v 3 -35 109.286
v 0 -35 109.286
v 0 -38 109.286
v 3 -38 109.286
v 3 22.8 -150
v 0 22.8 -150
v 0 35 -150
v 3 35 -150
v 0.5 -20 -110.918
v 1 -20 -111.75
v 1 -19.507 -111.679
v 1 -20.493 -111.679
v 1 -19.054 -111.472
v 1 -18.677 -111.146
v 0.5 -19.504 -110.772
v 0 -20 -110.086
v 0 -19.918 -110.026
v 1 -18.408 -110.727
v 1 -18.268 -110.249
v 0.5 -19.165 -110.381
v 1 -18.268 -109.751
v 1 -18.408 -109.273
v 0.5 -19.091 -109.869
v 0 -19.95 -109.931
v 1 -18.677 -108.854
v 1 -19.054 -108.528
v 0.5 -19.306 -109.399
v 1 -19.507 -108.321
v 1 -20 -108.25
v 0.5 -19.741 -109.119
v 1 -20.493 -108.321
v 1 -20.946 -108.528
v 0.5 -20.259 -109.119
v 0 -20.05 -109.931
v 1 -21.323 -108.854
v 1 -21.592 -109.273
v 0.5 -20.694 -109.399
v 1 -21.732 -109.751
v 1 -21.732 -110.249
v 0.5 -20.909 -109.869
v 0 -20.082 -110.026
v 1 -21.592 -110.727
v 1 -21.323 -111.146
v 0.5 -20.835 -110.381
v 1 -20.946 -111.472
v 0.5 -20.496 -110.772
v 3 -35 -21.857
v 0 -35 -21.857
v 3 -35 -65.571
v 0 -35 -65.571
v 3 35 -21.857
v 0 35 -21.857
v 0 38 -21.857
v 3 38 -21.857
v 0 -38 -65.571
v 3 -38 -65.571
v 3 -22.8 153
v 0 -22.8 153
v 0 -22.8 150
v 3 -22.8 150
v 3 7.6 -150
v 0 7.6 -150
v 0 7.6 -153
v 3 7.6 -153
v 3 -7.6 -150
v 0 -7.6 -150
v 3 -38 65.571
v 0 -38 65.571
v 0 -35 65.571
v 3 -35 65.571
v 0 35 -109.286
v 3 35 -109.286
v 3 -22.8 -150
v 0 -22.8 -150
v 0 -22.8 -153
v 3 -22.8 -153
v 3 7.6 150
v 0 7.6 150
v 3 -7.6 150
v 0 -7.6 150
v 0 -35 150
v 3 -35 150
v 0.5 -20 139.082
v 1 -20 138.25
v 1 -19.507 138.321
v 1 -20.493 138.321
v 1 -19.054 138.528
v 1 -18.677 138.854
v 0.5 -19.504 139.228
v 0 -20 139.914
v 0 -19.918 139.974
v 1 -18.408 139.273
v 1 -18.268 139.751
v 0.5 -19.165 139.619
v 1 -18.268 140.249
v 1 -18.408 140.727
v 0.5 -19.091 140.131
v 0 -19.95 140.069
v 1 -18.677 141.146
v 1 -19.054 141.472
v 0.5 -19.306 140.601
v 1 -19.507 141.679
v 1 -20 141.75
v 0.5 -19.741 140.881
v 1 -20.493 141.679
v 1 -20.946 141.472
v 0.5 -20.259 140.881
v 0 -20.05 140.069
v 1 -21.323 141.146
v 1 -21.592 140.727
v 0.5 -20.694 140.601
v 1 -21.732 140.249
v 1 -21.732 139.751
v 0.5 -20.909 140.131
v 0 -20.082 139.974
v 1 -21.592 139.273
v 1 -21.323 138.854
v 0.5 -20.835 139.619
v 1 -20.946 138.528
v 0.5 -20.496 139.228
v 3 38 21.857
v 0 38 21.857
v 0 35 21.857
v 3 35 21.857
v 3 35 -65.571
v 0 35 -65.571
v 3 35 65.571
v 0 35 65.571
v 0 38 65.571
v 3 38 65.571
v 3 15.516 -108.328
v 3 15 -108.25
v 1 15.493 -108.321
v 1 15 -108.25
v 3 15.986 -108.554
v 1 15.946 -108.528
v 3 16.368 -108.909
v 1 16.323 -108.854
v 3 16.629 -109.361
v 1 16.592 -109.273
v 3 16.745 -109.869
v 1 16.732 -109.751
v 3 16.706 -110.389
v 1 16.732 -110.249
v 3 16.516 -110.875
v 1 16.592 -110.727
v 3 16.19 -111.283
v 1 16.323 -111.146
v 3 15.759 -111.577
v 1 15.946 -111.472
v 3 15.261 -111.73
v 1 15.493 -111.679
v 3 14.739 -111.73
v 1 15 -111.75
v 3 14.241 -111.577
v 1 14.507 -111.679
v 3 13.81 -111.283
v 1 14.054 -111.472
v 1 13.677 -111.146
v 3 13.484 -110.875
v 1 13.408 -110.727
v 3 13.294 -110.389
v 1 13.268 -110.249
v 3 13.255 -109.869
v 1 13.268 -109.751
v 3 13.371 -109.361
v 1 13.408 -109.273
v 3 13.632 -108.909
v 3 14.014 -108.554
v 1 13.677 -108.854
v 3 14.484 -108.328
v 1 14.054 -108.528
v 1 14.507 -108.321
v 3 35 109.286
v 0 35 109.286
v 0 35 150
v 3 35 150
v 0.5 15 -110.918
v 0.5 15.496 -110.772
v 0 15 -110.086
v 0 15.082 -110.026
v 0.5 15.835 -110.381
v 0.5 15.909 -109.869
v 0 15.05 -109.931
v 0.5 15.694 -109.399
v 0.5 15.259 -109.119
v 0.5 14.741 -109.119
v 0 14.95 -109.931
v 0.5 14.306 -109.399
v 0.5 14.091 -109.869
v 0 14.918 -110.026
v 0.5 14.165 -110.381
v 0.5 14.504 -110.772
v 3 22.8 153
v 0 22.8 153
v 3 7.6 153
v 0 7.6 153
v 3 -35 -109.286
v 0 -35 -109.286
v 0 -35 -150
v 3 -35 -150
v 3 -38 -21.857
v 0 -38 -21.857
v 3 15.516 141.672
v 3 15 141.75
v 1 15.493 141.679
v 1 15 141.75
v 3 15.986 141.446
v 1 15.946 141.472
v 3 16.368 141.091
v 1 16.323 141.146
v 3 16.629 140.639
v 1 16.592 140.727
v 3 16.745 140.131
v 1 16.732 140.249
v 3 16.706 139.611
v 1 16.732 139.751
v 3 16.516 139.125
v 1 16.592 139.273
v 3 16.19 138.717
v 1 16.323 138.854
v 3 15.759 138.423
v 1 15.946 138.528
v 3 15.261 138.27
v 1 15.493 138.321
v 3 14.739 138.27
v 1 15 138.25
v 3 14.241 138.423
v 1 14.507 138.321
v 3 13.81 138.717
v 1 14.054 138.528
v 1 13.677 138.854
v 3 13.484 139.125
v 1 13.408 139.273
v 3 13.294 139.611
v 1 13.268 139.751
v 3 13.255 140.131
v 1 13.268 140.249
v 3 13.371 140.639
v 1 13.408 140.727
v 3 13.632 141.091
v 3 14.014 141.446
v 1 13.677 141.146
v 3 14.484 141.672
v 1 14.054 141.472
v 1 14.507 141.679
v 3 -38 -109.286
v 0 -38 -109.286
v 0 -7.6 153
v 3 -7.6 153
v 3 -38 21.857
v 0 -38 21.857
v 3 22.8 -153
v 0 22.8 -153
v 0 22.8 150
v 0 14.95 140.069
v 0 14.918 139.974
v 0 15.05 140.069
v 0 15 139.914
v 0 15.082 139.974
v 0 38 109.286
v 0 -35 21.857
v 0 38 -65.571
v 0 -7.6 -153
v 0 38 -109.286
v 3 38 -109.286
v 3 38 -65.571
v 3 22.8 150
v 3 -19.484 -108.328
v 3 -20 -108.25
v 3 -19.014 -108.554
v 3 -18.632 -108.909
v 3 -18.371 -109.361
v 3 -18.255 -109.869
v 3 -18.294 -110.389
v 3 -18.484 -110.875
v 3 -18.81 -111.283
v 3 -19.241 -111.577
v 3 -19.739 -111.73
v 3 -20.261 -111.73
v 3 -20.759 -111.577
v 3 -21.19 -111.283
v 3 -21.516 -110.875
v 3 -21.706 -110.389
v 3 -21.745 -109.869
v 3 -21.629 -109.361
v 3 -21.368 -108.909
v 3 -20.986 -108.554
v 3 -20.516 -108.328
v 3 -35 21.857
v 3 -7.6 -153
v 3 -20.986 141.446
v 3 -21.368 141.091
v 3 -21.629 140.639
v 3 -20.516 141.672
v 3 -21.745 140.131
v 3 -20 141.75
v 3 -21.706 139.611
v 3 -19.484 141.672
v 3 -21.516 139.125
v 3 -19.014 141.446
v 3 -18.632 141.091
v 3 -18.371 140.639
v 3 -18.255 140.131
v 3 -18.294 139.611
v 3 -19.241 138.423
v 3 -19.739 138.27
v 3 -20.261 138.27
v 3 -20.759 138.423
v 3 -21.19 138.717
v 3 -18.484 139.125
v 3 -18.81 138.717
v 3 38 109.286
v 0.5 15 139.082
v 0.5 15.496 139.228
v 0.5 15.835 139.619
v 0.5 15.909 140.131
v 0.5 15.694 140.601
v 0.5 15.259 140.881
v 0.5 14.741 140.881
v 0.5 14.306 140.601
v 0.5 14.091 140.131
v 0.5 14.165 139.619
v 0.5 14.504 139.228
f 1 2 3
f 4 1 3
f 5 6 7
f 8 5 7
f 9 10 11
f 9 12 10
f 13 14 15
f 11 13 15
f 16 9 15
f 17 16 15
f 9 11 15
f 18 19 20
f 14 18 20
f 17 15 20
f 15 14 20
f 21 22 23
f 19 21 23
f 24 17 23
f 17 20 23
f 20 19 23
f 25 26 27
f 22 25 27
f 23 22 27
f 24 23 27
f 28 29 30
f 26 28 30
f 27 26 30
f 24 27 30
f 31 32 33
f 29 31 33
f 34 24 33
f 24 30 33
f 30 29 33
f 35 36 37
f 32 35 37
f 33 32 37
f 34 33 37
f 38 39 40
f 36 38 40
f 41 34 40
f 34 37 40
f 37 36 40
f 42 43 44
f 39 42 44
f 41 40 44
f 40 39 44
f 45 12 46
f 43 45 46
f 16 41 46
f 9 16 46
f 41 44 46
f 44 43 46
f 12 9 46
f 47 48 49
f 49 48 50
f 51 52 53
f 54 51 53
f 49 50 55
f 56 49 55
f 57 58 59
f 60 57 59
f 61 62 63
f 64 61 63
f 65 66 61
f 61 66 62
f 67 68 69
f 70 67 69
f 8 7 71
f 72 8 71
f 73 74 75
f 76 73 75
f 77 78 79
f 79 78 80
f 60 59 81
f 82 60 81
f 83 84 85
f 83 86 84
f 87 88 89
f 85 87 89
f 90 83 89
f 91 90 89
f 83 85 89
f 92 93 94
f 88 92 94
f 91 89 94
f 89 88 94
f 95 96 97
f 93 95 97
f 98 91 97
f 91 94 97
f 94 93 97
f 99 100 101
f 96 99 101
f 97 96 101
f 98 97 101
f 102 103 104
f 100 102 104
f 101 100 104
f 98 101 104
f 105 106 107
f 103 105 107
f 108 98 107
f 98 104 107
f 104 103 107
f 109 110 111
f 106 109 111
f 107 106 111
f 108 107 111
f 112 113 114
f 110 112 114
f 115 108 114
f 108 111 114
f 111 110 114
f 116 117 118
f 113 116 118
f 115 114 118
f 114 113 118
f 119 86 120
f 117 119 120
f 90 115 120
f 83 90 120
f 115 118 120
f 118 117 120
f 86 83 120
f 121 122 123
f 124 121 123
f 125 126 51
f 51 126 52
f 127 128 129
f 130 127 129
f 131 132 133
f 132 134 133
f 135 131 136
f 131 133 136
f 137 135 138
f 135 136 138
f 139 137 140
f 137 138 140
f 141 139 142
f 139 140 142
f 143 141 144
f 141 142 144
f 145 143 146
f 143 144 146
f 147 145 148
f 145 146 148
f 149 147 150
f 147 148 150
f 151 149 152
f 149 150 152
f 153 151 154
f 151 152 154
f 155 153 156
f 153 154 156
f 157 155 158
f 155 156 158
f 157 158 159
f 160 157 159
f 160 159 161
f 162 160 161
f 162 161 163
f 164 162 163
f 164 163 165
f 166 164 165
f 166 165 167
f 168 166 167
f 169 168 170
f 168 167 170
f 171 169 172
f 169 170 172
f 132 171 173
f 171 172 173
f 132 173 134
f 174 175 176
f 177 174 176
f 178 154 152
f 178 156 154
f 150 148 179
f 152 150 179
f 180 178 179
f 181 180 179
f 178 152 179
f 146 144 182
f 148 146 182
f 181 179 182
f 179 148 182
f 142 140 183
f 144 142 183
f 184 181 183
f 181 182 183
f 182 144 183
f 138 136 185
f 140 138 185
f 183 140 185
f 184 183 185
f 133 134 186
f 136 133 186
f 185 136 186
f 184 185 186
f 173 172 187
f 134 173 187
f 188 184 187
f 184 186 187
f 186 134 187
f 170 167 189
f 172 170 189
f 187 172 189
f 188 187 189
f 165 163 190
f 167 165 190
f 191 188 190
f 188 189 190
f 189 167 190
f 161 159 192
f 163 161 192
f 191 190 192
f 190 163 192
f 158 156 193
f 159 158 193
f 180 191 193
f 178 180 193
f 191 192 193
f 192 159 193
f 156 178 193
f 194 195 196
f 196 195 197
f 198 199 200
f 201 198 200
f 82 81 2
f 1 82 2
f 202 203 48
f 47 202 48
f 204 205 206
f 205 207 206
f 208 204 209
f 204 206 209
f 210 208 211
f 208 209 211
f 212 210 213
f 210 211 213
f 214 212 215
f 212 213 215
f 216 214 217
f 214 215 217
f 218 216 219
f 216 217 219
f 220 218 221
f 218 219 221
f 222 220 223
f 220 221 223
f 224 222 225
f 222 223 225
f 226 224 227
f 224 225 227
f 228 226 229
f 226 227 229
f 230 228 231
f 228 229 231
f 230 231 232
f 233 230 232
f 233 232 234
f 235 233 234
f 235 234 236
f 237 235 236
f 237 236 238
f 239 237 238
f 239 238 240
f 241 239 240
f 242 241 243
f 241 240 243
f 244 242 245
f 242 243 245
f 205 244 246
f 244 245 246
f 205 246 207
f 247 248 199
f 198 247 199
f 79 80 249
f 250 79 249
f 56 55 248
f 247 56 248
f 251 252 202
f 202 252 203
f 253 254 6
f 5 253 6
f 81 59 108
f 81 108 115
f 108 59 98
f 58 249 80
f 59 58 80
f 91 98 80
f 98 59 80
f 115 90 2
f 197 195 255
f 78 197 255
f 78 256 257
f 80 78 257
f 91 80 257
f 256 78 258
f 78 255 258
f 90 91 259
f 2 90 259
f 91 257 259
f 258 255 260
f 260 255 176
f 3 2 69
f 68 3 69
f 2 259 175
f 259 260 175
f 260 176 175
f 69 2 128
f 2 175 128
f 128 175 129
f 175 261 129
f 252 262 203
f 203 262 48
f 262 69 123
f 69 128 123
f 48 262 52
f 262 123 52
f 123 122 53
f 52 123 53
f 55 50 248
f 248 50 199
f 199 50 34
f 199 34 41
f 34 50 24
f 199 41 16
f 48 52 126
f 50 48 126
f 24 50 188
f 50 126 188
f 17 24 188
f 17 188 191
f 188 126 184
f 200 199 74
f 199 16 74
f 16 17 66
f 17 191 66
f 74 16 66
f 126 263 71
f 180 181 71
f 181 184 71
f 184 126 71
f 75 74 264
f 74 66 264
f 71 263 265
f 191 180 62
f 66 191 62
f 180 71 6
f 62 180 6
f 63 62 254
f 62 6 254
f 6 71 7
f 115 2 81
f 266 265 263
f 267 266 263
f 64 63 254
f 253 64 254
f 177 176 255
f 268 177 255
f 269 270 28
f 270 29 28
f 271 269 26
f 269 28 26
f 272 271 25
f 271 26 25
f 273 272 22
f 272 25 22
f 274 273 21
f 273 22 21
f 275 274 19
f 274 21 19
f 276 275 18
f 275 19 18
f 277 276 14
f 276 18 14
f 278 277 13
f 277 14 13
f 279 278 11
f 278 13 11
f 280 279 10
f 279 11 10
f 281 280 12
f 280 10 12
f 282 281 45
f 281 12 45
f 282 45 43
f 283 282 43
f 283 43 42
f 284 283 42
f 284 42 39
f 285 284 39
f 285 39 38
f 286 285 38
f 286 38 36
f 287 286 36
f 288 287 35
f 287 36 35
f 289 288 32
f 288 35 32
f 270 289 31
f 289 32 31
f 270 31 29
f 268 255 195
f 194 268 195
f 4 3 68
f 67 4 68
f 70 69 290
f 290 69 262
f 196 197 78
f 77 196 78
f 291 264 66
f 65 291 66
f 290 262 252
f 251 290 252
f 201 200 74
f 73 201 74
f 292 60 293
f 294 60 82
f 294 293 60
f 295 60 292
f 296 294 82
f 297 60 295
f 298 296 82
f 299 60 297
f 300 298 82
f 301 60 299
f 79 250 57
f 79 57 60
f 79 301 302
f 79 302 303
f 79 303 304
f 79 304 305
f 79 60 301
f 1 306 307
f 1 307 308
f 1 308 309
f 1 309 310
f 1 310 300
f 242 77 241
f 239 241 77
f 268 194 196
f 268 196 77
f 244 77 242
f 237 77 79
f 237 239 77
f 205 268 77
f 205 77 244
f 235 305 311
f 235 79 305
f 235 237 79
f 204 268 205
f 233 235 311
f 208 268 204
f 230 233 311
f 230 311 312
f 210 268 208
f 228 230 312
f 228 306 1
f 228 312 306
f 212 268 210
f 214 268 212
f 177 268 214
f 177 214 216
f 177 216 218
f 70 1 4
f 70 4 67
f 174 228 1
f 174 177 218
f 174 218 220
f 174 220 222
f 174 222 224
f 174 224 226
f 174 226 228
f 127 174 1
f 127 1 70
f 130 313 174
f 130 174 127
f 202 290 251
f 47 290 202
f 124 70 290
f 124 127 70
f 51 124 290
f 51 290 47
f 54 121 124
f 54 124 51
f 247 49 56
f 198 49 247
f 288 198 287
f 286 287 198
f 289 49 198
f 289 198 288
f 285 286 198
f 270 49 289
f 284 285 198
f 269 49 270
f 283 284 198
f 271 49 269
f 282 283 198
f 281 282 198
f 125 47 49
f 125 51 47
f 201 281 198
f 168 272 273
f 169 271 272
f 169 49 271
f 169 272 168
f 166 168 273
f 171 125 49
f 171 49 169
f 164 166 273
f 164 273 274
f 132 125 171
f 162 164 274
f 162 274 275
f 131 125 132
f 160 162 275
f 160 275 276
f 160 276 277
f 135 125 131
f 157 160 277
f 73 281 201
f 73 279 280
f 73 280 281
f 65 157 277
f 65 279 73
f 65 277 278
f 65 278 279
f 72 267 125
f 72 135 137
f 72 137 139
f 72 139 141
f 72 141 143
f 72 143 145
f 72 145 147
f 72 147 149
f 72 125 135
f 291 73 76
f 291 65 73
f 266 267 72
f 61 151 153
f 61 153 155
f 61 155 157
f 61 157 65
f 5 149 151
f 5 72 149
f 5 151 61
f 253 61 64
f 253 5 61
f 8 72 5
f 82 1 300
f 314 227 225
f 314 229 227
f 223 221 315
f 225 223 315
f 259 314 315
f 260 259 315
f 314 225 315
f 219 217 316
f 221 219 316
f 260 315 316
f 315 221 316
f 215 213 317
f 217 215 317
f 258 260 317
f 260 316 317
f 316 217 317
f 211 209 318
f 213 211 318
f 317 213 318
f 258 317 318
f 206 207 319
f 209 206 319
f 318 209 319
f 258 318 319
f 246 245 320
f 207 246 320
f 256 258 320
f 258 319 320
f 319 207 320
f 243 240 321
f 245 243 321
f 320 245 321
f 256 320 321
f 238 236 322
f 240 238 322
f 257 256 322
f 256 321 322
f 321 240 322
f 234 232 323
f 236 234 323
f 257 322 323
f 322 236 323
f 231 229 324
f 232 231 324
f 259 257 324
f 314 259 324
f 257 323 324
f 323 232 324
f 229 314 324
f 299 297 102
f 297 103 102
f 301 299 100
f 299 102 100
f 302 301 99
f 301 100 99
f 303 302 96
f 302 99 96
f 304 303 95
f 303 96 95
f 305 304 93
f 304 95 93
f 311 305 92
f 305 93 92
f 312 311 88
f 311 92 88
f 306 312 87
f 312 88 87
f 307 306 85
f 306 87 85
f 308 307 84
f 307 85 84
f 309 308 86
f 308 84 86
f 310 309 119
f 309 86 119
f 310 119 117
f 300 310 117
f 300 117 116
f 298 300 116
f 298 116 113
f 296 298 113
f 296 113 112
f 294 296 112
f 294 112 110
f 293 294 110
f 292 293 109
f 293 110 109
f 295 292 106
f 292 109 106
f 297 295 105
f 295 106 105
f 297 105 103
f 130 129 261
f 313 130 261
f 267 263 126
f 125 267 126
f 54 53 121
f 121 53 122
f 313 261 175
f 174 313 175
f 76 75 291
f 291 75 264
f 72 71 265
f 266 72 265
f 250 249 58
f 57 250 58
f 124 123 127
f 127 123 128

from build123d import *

# Parameters (mm, degrees)
BOSS_EXTRU_3_DEPTH                  = 3
DIAM_TRE_DU_PER_AGE_3_5_3_5_1_D     = 3.5
DIAM_TRE_DU_PER_AGE_3_5_3_5_1_DEPTH = 2
DIAM_TRE_DU_PER_AGE_3_5_3_5_1_TIP   = 1.051506083


with BuildPart() as part:
    # Esquisse3 → Boss.-Extru.3 (new body)
    with BuildSketch(Plane(origin=(0, 0, 0), x_dir=(0, 0, -1), z_dir=(1, 0, 0))):
        Polygon((109.285714286, 38), (65.571428571, 38), (65.571428571, 35), (21.857142857, 35), (21.857142857, 38), (-21.857142857, 38), (-21.857142857, 35), (-65.571428571, 35), (-65.571428571, 38), (-109.285714286, 38), (-109.285714286, 35), (-150, 35), (-150, 22.8), (-153, 22.8), (-153, 7.6), (-150, 7.6), (-150, -7.6), (-153, -7.6), (-153, -22.8), (-150, -22.8), (-150, -35), (-109.285714286, -35), (-109.285714286, -38), (-65.571428571, -38), (-65.571428571, -35), (-21.857142857, -35), (-21.857142857, -38), (21.857142857, -38), (21.857142857, -35), (65.571428571, -35), (65.571428571, -38), (109.285714286, -38), (109.285714286, -35), (150, -35), (150, -22.8), (153, -22.8), (153, -7.6), (150, -7.6), (150, 7.6), (153, 7.6), (153, 22.8), (150, 22.8), (150, 35), (109.285714286, 35), align=None)
    extrude(amount=BOSS_EXTRU_3_DEPTH)

    # Diamètre du perçage Ø3.5 (3.5)1
    with Locations(Plane(origin=(3, 0, 0), x_dir=(0, 0, -1), z_dir=(1, 0, 0))):
        with Locations((110, 15), (110, -20), (-140, 15), (-140, -20)):
            Hole(DIAM_TRE_DU_PER_AGE_3_5_3_5_1_D / 2, depth=DIAM_TRE_DU_PER_AGE_3_5_3_5_1_DEPTH)
            with Locations((0, 0, -(DIAM_TRE_DU_PER_AGE_3_5_3_5_1_DEPTH + DIAM_TRE_DU_PER_AGE_3_5_3_5_1_TIP / 2))):  # 118° drill point
                Cone(0, DIAM_TRE_DU_PER_AGE_3_5_3_5_1_D / 2, DIAM_TRE_DU_PER_AGE_3_5_3_5_1_TIP, mode=Mode.SUBTRACT)


solid = part.part
